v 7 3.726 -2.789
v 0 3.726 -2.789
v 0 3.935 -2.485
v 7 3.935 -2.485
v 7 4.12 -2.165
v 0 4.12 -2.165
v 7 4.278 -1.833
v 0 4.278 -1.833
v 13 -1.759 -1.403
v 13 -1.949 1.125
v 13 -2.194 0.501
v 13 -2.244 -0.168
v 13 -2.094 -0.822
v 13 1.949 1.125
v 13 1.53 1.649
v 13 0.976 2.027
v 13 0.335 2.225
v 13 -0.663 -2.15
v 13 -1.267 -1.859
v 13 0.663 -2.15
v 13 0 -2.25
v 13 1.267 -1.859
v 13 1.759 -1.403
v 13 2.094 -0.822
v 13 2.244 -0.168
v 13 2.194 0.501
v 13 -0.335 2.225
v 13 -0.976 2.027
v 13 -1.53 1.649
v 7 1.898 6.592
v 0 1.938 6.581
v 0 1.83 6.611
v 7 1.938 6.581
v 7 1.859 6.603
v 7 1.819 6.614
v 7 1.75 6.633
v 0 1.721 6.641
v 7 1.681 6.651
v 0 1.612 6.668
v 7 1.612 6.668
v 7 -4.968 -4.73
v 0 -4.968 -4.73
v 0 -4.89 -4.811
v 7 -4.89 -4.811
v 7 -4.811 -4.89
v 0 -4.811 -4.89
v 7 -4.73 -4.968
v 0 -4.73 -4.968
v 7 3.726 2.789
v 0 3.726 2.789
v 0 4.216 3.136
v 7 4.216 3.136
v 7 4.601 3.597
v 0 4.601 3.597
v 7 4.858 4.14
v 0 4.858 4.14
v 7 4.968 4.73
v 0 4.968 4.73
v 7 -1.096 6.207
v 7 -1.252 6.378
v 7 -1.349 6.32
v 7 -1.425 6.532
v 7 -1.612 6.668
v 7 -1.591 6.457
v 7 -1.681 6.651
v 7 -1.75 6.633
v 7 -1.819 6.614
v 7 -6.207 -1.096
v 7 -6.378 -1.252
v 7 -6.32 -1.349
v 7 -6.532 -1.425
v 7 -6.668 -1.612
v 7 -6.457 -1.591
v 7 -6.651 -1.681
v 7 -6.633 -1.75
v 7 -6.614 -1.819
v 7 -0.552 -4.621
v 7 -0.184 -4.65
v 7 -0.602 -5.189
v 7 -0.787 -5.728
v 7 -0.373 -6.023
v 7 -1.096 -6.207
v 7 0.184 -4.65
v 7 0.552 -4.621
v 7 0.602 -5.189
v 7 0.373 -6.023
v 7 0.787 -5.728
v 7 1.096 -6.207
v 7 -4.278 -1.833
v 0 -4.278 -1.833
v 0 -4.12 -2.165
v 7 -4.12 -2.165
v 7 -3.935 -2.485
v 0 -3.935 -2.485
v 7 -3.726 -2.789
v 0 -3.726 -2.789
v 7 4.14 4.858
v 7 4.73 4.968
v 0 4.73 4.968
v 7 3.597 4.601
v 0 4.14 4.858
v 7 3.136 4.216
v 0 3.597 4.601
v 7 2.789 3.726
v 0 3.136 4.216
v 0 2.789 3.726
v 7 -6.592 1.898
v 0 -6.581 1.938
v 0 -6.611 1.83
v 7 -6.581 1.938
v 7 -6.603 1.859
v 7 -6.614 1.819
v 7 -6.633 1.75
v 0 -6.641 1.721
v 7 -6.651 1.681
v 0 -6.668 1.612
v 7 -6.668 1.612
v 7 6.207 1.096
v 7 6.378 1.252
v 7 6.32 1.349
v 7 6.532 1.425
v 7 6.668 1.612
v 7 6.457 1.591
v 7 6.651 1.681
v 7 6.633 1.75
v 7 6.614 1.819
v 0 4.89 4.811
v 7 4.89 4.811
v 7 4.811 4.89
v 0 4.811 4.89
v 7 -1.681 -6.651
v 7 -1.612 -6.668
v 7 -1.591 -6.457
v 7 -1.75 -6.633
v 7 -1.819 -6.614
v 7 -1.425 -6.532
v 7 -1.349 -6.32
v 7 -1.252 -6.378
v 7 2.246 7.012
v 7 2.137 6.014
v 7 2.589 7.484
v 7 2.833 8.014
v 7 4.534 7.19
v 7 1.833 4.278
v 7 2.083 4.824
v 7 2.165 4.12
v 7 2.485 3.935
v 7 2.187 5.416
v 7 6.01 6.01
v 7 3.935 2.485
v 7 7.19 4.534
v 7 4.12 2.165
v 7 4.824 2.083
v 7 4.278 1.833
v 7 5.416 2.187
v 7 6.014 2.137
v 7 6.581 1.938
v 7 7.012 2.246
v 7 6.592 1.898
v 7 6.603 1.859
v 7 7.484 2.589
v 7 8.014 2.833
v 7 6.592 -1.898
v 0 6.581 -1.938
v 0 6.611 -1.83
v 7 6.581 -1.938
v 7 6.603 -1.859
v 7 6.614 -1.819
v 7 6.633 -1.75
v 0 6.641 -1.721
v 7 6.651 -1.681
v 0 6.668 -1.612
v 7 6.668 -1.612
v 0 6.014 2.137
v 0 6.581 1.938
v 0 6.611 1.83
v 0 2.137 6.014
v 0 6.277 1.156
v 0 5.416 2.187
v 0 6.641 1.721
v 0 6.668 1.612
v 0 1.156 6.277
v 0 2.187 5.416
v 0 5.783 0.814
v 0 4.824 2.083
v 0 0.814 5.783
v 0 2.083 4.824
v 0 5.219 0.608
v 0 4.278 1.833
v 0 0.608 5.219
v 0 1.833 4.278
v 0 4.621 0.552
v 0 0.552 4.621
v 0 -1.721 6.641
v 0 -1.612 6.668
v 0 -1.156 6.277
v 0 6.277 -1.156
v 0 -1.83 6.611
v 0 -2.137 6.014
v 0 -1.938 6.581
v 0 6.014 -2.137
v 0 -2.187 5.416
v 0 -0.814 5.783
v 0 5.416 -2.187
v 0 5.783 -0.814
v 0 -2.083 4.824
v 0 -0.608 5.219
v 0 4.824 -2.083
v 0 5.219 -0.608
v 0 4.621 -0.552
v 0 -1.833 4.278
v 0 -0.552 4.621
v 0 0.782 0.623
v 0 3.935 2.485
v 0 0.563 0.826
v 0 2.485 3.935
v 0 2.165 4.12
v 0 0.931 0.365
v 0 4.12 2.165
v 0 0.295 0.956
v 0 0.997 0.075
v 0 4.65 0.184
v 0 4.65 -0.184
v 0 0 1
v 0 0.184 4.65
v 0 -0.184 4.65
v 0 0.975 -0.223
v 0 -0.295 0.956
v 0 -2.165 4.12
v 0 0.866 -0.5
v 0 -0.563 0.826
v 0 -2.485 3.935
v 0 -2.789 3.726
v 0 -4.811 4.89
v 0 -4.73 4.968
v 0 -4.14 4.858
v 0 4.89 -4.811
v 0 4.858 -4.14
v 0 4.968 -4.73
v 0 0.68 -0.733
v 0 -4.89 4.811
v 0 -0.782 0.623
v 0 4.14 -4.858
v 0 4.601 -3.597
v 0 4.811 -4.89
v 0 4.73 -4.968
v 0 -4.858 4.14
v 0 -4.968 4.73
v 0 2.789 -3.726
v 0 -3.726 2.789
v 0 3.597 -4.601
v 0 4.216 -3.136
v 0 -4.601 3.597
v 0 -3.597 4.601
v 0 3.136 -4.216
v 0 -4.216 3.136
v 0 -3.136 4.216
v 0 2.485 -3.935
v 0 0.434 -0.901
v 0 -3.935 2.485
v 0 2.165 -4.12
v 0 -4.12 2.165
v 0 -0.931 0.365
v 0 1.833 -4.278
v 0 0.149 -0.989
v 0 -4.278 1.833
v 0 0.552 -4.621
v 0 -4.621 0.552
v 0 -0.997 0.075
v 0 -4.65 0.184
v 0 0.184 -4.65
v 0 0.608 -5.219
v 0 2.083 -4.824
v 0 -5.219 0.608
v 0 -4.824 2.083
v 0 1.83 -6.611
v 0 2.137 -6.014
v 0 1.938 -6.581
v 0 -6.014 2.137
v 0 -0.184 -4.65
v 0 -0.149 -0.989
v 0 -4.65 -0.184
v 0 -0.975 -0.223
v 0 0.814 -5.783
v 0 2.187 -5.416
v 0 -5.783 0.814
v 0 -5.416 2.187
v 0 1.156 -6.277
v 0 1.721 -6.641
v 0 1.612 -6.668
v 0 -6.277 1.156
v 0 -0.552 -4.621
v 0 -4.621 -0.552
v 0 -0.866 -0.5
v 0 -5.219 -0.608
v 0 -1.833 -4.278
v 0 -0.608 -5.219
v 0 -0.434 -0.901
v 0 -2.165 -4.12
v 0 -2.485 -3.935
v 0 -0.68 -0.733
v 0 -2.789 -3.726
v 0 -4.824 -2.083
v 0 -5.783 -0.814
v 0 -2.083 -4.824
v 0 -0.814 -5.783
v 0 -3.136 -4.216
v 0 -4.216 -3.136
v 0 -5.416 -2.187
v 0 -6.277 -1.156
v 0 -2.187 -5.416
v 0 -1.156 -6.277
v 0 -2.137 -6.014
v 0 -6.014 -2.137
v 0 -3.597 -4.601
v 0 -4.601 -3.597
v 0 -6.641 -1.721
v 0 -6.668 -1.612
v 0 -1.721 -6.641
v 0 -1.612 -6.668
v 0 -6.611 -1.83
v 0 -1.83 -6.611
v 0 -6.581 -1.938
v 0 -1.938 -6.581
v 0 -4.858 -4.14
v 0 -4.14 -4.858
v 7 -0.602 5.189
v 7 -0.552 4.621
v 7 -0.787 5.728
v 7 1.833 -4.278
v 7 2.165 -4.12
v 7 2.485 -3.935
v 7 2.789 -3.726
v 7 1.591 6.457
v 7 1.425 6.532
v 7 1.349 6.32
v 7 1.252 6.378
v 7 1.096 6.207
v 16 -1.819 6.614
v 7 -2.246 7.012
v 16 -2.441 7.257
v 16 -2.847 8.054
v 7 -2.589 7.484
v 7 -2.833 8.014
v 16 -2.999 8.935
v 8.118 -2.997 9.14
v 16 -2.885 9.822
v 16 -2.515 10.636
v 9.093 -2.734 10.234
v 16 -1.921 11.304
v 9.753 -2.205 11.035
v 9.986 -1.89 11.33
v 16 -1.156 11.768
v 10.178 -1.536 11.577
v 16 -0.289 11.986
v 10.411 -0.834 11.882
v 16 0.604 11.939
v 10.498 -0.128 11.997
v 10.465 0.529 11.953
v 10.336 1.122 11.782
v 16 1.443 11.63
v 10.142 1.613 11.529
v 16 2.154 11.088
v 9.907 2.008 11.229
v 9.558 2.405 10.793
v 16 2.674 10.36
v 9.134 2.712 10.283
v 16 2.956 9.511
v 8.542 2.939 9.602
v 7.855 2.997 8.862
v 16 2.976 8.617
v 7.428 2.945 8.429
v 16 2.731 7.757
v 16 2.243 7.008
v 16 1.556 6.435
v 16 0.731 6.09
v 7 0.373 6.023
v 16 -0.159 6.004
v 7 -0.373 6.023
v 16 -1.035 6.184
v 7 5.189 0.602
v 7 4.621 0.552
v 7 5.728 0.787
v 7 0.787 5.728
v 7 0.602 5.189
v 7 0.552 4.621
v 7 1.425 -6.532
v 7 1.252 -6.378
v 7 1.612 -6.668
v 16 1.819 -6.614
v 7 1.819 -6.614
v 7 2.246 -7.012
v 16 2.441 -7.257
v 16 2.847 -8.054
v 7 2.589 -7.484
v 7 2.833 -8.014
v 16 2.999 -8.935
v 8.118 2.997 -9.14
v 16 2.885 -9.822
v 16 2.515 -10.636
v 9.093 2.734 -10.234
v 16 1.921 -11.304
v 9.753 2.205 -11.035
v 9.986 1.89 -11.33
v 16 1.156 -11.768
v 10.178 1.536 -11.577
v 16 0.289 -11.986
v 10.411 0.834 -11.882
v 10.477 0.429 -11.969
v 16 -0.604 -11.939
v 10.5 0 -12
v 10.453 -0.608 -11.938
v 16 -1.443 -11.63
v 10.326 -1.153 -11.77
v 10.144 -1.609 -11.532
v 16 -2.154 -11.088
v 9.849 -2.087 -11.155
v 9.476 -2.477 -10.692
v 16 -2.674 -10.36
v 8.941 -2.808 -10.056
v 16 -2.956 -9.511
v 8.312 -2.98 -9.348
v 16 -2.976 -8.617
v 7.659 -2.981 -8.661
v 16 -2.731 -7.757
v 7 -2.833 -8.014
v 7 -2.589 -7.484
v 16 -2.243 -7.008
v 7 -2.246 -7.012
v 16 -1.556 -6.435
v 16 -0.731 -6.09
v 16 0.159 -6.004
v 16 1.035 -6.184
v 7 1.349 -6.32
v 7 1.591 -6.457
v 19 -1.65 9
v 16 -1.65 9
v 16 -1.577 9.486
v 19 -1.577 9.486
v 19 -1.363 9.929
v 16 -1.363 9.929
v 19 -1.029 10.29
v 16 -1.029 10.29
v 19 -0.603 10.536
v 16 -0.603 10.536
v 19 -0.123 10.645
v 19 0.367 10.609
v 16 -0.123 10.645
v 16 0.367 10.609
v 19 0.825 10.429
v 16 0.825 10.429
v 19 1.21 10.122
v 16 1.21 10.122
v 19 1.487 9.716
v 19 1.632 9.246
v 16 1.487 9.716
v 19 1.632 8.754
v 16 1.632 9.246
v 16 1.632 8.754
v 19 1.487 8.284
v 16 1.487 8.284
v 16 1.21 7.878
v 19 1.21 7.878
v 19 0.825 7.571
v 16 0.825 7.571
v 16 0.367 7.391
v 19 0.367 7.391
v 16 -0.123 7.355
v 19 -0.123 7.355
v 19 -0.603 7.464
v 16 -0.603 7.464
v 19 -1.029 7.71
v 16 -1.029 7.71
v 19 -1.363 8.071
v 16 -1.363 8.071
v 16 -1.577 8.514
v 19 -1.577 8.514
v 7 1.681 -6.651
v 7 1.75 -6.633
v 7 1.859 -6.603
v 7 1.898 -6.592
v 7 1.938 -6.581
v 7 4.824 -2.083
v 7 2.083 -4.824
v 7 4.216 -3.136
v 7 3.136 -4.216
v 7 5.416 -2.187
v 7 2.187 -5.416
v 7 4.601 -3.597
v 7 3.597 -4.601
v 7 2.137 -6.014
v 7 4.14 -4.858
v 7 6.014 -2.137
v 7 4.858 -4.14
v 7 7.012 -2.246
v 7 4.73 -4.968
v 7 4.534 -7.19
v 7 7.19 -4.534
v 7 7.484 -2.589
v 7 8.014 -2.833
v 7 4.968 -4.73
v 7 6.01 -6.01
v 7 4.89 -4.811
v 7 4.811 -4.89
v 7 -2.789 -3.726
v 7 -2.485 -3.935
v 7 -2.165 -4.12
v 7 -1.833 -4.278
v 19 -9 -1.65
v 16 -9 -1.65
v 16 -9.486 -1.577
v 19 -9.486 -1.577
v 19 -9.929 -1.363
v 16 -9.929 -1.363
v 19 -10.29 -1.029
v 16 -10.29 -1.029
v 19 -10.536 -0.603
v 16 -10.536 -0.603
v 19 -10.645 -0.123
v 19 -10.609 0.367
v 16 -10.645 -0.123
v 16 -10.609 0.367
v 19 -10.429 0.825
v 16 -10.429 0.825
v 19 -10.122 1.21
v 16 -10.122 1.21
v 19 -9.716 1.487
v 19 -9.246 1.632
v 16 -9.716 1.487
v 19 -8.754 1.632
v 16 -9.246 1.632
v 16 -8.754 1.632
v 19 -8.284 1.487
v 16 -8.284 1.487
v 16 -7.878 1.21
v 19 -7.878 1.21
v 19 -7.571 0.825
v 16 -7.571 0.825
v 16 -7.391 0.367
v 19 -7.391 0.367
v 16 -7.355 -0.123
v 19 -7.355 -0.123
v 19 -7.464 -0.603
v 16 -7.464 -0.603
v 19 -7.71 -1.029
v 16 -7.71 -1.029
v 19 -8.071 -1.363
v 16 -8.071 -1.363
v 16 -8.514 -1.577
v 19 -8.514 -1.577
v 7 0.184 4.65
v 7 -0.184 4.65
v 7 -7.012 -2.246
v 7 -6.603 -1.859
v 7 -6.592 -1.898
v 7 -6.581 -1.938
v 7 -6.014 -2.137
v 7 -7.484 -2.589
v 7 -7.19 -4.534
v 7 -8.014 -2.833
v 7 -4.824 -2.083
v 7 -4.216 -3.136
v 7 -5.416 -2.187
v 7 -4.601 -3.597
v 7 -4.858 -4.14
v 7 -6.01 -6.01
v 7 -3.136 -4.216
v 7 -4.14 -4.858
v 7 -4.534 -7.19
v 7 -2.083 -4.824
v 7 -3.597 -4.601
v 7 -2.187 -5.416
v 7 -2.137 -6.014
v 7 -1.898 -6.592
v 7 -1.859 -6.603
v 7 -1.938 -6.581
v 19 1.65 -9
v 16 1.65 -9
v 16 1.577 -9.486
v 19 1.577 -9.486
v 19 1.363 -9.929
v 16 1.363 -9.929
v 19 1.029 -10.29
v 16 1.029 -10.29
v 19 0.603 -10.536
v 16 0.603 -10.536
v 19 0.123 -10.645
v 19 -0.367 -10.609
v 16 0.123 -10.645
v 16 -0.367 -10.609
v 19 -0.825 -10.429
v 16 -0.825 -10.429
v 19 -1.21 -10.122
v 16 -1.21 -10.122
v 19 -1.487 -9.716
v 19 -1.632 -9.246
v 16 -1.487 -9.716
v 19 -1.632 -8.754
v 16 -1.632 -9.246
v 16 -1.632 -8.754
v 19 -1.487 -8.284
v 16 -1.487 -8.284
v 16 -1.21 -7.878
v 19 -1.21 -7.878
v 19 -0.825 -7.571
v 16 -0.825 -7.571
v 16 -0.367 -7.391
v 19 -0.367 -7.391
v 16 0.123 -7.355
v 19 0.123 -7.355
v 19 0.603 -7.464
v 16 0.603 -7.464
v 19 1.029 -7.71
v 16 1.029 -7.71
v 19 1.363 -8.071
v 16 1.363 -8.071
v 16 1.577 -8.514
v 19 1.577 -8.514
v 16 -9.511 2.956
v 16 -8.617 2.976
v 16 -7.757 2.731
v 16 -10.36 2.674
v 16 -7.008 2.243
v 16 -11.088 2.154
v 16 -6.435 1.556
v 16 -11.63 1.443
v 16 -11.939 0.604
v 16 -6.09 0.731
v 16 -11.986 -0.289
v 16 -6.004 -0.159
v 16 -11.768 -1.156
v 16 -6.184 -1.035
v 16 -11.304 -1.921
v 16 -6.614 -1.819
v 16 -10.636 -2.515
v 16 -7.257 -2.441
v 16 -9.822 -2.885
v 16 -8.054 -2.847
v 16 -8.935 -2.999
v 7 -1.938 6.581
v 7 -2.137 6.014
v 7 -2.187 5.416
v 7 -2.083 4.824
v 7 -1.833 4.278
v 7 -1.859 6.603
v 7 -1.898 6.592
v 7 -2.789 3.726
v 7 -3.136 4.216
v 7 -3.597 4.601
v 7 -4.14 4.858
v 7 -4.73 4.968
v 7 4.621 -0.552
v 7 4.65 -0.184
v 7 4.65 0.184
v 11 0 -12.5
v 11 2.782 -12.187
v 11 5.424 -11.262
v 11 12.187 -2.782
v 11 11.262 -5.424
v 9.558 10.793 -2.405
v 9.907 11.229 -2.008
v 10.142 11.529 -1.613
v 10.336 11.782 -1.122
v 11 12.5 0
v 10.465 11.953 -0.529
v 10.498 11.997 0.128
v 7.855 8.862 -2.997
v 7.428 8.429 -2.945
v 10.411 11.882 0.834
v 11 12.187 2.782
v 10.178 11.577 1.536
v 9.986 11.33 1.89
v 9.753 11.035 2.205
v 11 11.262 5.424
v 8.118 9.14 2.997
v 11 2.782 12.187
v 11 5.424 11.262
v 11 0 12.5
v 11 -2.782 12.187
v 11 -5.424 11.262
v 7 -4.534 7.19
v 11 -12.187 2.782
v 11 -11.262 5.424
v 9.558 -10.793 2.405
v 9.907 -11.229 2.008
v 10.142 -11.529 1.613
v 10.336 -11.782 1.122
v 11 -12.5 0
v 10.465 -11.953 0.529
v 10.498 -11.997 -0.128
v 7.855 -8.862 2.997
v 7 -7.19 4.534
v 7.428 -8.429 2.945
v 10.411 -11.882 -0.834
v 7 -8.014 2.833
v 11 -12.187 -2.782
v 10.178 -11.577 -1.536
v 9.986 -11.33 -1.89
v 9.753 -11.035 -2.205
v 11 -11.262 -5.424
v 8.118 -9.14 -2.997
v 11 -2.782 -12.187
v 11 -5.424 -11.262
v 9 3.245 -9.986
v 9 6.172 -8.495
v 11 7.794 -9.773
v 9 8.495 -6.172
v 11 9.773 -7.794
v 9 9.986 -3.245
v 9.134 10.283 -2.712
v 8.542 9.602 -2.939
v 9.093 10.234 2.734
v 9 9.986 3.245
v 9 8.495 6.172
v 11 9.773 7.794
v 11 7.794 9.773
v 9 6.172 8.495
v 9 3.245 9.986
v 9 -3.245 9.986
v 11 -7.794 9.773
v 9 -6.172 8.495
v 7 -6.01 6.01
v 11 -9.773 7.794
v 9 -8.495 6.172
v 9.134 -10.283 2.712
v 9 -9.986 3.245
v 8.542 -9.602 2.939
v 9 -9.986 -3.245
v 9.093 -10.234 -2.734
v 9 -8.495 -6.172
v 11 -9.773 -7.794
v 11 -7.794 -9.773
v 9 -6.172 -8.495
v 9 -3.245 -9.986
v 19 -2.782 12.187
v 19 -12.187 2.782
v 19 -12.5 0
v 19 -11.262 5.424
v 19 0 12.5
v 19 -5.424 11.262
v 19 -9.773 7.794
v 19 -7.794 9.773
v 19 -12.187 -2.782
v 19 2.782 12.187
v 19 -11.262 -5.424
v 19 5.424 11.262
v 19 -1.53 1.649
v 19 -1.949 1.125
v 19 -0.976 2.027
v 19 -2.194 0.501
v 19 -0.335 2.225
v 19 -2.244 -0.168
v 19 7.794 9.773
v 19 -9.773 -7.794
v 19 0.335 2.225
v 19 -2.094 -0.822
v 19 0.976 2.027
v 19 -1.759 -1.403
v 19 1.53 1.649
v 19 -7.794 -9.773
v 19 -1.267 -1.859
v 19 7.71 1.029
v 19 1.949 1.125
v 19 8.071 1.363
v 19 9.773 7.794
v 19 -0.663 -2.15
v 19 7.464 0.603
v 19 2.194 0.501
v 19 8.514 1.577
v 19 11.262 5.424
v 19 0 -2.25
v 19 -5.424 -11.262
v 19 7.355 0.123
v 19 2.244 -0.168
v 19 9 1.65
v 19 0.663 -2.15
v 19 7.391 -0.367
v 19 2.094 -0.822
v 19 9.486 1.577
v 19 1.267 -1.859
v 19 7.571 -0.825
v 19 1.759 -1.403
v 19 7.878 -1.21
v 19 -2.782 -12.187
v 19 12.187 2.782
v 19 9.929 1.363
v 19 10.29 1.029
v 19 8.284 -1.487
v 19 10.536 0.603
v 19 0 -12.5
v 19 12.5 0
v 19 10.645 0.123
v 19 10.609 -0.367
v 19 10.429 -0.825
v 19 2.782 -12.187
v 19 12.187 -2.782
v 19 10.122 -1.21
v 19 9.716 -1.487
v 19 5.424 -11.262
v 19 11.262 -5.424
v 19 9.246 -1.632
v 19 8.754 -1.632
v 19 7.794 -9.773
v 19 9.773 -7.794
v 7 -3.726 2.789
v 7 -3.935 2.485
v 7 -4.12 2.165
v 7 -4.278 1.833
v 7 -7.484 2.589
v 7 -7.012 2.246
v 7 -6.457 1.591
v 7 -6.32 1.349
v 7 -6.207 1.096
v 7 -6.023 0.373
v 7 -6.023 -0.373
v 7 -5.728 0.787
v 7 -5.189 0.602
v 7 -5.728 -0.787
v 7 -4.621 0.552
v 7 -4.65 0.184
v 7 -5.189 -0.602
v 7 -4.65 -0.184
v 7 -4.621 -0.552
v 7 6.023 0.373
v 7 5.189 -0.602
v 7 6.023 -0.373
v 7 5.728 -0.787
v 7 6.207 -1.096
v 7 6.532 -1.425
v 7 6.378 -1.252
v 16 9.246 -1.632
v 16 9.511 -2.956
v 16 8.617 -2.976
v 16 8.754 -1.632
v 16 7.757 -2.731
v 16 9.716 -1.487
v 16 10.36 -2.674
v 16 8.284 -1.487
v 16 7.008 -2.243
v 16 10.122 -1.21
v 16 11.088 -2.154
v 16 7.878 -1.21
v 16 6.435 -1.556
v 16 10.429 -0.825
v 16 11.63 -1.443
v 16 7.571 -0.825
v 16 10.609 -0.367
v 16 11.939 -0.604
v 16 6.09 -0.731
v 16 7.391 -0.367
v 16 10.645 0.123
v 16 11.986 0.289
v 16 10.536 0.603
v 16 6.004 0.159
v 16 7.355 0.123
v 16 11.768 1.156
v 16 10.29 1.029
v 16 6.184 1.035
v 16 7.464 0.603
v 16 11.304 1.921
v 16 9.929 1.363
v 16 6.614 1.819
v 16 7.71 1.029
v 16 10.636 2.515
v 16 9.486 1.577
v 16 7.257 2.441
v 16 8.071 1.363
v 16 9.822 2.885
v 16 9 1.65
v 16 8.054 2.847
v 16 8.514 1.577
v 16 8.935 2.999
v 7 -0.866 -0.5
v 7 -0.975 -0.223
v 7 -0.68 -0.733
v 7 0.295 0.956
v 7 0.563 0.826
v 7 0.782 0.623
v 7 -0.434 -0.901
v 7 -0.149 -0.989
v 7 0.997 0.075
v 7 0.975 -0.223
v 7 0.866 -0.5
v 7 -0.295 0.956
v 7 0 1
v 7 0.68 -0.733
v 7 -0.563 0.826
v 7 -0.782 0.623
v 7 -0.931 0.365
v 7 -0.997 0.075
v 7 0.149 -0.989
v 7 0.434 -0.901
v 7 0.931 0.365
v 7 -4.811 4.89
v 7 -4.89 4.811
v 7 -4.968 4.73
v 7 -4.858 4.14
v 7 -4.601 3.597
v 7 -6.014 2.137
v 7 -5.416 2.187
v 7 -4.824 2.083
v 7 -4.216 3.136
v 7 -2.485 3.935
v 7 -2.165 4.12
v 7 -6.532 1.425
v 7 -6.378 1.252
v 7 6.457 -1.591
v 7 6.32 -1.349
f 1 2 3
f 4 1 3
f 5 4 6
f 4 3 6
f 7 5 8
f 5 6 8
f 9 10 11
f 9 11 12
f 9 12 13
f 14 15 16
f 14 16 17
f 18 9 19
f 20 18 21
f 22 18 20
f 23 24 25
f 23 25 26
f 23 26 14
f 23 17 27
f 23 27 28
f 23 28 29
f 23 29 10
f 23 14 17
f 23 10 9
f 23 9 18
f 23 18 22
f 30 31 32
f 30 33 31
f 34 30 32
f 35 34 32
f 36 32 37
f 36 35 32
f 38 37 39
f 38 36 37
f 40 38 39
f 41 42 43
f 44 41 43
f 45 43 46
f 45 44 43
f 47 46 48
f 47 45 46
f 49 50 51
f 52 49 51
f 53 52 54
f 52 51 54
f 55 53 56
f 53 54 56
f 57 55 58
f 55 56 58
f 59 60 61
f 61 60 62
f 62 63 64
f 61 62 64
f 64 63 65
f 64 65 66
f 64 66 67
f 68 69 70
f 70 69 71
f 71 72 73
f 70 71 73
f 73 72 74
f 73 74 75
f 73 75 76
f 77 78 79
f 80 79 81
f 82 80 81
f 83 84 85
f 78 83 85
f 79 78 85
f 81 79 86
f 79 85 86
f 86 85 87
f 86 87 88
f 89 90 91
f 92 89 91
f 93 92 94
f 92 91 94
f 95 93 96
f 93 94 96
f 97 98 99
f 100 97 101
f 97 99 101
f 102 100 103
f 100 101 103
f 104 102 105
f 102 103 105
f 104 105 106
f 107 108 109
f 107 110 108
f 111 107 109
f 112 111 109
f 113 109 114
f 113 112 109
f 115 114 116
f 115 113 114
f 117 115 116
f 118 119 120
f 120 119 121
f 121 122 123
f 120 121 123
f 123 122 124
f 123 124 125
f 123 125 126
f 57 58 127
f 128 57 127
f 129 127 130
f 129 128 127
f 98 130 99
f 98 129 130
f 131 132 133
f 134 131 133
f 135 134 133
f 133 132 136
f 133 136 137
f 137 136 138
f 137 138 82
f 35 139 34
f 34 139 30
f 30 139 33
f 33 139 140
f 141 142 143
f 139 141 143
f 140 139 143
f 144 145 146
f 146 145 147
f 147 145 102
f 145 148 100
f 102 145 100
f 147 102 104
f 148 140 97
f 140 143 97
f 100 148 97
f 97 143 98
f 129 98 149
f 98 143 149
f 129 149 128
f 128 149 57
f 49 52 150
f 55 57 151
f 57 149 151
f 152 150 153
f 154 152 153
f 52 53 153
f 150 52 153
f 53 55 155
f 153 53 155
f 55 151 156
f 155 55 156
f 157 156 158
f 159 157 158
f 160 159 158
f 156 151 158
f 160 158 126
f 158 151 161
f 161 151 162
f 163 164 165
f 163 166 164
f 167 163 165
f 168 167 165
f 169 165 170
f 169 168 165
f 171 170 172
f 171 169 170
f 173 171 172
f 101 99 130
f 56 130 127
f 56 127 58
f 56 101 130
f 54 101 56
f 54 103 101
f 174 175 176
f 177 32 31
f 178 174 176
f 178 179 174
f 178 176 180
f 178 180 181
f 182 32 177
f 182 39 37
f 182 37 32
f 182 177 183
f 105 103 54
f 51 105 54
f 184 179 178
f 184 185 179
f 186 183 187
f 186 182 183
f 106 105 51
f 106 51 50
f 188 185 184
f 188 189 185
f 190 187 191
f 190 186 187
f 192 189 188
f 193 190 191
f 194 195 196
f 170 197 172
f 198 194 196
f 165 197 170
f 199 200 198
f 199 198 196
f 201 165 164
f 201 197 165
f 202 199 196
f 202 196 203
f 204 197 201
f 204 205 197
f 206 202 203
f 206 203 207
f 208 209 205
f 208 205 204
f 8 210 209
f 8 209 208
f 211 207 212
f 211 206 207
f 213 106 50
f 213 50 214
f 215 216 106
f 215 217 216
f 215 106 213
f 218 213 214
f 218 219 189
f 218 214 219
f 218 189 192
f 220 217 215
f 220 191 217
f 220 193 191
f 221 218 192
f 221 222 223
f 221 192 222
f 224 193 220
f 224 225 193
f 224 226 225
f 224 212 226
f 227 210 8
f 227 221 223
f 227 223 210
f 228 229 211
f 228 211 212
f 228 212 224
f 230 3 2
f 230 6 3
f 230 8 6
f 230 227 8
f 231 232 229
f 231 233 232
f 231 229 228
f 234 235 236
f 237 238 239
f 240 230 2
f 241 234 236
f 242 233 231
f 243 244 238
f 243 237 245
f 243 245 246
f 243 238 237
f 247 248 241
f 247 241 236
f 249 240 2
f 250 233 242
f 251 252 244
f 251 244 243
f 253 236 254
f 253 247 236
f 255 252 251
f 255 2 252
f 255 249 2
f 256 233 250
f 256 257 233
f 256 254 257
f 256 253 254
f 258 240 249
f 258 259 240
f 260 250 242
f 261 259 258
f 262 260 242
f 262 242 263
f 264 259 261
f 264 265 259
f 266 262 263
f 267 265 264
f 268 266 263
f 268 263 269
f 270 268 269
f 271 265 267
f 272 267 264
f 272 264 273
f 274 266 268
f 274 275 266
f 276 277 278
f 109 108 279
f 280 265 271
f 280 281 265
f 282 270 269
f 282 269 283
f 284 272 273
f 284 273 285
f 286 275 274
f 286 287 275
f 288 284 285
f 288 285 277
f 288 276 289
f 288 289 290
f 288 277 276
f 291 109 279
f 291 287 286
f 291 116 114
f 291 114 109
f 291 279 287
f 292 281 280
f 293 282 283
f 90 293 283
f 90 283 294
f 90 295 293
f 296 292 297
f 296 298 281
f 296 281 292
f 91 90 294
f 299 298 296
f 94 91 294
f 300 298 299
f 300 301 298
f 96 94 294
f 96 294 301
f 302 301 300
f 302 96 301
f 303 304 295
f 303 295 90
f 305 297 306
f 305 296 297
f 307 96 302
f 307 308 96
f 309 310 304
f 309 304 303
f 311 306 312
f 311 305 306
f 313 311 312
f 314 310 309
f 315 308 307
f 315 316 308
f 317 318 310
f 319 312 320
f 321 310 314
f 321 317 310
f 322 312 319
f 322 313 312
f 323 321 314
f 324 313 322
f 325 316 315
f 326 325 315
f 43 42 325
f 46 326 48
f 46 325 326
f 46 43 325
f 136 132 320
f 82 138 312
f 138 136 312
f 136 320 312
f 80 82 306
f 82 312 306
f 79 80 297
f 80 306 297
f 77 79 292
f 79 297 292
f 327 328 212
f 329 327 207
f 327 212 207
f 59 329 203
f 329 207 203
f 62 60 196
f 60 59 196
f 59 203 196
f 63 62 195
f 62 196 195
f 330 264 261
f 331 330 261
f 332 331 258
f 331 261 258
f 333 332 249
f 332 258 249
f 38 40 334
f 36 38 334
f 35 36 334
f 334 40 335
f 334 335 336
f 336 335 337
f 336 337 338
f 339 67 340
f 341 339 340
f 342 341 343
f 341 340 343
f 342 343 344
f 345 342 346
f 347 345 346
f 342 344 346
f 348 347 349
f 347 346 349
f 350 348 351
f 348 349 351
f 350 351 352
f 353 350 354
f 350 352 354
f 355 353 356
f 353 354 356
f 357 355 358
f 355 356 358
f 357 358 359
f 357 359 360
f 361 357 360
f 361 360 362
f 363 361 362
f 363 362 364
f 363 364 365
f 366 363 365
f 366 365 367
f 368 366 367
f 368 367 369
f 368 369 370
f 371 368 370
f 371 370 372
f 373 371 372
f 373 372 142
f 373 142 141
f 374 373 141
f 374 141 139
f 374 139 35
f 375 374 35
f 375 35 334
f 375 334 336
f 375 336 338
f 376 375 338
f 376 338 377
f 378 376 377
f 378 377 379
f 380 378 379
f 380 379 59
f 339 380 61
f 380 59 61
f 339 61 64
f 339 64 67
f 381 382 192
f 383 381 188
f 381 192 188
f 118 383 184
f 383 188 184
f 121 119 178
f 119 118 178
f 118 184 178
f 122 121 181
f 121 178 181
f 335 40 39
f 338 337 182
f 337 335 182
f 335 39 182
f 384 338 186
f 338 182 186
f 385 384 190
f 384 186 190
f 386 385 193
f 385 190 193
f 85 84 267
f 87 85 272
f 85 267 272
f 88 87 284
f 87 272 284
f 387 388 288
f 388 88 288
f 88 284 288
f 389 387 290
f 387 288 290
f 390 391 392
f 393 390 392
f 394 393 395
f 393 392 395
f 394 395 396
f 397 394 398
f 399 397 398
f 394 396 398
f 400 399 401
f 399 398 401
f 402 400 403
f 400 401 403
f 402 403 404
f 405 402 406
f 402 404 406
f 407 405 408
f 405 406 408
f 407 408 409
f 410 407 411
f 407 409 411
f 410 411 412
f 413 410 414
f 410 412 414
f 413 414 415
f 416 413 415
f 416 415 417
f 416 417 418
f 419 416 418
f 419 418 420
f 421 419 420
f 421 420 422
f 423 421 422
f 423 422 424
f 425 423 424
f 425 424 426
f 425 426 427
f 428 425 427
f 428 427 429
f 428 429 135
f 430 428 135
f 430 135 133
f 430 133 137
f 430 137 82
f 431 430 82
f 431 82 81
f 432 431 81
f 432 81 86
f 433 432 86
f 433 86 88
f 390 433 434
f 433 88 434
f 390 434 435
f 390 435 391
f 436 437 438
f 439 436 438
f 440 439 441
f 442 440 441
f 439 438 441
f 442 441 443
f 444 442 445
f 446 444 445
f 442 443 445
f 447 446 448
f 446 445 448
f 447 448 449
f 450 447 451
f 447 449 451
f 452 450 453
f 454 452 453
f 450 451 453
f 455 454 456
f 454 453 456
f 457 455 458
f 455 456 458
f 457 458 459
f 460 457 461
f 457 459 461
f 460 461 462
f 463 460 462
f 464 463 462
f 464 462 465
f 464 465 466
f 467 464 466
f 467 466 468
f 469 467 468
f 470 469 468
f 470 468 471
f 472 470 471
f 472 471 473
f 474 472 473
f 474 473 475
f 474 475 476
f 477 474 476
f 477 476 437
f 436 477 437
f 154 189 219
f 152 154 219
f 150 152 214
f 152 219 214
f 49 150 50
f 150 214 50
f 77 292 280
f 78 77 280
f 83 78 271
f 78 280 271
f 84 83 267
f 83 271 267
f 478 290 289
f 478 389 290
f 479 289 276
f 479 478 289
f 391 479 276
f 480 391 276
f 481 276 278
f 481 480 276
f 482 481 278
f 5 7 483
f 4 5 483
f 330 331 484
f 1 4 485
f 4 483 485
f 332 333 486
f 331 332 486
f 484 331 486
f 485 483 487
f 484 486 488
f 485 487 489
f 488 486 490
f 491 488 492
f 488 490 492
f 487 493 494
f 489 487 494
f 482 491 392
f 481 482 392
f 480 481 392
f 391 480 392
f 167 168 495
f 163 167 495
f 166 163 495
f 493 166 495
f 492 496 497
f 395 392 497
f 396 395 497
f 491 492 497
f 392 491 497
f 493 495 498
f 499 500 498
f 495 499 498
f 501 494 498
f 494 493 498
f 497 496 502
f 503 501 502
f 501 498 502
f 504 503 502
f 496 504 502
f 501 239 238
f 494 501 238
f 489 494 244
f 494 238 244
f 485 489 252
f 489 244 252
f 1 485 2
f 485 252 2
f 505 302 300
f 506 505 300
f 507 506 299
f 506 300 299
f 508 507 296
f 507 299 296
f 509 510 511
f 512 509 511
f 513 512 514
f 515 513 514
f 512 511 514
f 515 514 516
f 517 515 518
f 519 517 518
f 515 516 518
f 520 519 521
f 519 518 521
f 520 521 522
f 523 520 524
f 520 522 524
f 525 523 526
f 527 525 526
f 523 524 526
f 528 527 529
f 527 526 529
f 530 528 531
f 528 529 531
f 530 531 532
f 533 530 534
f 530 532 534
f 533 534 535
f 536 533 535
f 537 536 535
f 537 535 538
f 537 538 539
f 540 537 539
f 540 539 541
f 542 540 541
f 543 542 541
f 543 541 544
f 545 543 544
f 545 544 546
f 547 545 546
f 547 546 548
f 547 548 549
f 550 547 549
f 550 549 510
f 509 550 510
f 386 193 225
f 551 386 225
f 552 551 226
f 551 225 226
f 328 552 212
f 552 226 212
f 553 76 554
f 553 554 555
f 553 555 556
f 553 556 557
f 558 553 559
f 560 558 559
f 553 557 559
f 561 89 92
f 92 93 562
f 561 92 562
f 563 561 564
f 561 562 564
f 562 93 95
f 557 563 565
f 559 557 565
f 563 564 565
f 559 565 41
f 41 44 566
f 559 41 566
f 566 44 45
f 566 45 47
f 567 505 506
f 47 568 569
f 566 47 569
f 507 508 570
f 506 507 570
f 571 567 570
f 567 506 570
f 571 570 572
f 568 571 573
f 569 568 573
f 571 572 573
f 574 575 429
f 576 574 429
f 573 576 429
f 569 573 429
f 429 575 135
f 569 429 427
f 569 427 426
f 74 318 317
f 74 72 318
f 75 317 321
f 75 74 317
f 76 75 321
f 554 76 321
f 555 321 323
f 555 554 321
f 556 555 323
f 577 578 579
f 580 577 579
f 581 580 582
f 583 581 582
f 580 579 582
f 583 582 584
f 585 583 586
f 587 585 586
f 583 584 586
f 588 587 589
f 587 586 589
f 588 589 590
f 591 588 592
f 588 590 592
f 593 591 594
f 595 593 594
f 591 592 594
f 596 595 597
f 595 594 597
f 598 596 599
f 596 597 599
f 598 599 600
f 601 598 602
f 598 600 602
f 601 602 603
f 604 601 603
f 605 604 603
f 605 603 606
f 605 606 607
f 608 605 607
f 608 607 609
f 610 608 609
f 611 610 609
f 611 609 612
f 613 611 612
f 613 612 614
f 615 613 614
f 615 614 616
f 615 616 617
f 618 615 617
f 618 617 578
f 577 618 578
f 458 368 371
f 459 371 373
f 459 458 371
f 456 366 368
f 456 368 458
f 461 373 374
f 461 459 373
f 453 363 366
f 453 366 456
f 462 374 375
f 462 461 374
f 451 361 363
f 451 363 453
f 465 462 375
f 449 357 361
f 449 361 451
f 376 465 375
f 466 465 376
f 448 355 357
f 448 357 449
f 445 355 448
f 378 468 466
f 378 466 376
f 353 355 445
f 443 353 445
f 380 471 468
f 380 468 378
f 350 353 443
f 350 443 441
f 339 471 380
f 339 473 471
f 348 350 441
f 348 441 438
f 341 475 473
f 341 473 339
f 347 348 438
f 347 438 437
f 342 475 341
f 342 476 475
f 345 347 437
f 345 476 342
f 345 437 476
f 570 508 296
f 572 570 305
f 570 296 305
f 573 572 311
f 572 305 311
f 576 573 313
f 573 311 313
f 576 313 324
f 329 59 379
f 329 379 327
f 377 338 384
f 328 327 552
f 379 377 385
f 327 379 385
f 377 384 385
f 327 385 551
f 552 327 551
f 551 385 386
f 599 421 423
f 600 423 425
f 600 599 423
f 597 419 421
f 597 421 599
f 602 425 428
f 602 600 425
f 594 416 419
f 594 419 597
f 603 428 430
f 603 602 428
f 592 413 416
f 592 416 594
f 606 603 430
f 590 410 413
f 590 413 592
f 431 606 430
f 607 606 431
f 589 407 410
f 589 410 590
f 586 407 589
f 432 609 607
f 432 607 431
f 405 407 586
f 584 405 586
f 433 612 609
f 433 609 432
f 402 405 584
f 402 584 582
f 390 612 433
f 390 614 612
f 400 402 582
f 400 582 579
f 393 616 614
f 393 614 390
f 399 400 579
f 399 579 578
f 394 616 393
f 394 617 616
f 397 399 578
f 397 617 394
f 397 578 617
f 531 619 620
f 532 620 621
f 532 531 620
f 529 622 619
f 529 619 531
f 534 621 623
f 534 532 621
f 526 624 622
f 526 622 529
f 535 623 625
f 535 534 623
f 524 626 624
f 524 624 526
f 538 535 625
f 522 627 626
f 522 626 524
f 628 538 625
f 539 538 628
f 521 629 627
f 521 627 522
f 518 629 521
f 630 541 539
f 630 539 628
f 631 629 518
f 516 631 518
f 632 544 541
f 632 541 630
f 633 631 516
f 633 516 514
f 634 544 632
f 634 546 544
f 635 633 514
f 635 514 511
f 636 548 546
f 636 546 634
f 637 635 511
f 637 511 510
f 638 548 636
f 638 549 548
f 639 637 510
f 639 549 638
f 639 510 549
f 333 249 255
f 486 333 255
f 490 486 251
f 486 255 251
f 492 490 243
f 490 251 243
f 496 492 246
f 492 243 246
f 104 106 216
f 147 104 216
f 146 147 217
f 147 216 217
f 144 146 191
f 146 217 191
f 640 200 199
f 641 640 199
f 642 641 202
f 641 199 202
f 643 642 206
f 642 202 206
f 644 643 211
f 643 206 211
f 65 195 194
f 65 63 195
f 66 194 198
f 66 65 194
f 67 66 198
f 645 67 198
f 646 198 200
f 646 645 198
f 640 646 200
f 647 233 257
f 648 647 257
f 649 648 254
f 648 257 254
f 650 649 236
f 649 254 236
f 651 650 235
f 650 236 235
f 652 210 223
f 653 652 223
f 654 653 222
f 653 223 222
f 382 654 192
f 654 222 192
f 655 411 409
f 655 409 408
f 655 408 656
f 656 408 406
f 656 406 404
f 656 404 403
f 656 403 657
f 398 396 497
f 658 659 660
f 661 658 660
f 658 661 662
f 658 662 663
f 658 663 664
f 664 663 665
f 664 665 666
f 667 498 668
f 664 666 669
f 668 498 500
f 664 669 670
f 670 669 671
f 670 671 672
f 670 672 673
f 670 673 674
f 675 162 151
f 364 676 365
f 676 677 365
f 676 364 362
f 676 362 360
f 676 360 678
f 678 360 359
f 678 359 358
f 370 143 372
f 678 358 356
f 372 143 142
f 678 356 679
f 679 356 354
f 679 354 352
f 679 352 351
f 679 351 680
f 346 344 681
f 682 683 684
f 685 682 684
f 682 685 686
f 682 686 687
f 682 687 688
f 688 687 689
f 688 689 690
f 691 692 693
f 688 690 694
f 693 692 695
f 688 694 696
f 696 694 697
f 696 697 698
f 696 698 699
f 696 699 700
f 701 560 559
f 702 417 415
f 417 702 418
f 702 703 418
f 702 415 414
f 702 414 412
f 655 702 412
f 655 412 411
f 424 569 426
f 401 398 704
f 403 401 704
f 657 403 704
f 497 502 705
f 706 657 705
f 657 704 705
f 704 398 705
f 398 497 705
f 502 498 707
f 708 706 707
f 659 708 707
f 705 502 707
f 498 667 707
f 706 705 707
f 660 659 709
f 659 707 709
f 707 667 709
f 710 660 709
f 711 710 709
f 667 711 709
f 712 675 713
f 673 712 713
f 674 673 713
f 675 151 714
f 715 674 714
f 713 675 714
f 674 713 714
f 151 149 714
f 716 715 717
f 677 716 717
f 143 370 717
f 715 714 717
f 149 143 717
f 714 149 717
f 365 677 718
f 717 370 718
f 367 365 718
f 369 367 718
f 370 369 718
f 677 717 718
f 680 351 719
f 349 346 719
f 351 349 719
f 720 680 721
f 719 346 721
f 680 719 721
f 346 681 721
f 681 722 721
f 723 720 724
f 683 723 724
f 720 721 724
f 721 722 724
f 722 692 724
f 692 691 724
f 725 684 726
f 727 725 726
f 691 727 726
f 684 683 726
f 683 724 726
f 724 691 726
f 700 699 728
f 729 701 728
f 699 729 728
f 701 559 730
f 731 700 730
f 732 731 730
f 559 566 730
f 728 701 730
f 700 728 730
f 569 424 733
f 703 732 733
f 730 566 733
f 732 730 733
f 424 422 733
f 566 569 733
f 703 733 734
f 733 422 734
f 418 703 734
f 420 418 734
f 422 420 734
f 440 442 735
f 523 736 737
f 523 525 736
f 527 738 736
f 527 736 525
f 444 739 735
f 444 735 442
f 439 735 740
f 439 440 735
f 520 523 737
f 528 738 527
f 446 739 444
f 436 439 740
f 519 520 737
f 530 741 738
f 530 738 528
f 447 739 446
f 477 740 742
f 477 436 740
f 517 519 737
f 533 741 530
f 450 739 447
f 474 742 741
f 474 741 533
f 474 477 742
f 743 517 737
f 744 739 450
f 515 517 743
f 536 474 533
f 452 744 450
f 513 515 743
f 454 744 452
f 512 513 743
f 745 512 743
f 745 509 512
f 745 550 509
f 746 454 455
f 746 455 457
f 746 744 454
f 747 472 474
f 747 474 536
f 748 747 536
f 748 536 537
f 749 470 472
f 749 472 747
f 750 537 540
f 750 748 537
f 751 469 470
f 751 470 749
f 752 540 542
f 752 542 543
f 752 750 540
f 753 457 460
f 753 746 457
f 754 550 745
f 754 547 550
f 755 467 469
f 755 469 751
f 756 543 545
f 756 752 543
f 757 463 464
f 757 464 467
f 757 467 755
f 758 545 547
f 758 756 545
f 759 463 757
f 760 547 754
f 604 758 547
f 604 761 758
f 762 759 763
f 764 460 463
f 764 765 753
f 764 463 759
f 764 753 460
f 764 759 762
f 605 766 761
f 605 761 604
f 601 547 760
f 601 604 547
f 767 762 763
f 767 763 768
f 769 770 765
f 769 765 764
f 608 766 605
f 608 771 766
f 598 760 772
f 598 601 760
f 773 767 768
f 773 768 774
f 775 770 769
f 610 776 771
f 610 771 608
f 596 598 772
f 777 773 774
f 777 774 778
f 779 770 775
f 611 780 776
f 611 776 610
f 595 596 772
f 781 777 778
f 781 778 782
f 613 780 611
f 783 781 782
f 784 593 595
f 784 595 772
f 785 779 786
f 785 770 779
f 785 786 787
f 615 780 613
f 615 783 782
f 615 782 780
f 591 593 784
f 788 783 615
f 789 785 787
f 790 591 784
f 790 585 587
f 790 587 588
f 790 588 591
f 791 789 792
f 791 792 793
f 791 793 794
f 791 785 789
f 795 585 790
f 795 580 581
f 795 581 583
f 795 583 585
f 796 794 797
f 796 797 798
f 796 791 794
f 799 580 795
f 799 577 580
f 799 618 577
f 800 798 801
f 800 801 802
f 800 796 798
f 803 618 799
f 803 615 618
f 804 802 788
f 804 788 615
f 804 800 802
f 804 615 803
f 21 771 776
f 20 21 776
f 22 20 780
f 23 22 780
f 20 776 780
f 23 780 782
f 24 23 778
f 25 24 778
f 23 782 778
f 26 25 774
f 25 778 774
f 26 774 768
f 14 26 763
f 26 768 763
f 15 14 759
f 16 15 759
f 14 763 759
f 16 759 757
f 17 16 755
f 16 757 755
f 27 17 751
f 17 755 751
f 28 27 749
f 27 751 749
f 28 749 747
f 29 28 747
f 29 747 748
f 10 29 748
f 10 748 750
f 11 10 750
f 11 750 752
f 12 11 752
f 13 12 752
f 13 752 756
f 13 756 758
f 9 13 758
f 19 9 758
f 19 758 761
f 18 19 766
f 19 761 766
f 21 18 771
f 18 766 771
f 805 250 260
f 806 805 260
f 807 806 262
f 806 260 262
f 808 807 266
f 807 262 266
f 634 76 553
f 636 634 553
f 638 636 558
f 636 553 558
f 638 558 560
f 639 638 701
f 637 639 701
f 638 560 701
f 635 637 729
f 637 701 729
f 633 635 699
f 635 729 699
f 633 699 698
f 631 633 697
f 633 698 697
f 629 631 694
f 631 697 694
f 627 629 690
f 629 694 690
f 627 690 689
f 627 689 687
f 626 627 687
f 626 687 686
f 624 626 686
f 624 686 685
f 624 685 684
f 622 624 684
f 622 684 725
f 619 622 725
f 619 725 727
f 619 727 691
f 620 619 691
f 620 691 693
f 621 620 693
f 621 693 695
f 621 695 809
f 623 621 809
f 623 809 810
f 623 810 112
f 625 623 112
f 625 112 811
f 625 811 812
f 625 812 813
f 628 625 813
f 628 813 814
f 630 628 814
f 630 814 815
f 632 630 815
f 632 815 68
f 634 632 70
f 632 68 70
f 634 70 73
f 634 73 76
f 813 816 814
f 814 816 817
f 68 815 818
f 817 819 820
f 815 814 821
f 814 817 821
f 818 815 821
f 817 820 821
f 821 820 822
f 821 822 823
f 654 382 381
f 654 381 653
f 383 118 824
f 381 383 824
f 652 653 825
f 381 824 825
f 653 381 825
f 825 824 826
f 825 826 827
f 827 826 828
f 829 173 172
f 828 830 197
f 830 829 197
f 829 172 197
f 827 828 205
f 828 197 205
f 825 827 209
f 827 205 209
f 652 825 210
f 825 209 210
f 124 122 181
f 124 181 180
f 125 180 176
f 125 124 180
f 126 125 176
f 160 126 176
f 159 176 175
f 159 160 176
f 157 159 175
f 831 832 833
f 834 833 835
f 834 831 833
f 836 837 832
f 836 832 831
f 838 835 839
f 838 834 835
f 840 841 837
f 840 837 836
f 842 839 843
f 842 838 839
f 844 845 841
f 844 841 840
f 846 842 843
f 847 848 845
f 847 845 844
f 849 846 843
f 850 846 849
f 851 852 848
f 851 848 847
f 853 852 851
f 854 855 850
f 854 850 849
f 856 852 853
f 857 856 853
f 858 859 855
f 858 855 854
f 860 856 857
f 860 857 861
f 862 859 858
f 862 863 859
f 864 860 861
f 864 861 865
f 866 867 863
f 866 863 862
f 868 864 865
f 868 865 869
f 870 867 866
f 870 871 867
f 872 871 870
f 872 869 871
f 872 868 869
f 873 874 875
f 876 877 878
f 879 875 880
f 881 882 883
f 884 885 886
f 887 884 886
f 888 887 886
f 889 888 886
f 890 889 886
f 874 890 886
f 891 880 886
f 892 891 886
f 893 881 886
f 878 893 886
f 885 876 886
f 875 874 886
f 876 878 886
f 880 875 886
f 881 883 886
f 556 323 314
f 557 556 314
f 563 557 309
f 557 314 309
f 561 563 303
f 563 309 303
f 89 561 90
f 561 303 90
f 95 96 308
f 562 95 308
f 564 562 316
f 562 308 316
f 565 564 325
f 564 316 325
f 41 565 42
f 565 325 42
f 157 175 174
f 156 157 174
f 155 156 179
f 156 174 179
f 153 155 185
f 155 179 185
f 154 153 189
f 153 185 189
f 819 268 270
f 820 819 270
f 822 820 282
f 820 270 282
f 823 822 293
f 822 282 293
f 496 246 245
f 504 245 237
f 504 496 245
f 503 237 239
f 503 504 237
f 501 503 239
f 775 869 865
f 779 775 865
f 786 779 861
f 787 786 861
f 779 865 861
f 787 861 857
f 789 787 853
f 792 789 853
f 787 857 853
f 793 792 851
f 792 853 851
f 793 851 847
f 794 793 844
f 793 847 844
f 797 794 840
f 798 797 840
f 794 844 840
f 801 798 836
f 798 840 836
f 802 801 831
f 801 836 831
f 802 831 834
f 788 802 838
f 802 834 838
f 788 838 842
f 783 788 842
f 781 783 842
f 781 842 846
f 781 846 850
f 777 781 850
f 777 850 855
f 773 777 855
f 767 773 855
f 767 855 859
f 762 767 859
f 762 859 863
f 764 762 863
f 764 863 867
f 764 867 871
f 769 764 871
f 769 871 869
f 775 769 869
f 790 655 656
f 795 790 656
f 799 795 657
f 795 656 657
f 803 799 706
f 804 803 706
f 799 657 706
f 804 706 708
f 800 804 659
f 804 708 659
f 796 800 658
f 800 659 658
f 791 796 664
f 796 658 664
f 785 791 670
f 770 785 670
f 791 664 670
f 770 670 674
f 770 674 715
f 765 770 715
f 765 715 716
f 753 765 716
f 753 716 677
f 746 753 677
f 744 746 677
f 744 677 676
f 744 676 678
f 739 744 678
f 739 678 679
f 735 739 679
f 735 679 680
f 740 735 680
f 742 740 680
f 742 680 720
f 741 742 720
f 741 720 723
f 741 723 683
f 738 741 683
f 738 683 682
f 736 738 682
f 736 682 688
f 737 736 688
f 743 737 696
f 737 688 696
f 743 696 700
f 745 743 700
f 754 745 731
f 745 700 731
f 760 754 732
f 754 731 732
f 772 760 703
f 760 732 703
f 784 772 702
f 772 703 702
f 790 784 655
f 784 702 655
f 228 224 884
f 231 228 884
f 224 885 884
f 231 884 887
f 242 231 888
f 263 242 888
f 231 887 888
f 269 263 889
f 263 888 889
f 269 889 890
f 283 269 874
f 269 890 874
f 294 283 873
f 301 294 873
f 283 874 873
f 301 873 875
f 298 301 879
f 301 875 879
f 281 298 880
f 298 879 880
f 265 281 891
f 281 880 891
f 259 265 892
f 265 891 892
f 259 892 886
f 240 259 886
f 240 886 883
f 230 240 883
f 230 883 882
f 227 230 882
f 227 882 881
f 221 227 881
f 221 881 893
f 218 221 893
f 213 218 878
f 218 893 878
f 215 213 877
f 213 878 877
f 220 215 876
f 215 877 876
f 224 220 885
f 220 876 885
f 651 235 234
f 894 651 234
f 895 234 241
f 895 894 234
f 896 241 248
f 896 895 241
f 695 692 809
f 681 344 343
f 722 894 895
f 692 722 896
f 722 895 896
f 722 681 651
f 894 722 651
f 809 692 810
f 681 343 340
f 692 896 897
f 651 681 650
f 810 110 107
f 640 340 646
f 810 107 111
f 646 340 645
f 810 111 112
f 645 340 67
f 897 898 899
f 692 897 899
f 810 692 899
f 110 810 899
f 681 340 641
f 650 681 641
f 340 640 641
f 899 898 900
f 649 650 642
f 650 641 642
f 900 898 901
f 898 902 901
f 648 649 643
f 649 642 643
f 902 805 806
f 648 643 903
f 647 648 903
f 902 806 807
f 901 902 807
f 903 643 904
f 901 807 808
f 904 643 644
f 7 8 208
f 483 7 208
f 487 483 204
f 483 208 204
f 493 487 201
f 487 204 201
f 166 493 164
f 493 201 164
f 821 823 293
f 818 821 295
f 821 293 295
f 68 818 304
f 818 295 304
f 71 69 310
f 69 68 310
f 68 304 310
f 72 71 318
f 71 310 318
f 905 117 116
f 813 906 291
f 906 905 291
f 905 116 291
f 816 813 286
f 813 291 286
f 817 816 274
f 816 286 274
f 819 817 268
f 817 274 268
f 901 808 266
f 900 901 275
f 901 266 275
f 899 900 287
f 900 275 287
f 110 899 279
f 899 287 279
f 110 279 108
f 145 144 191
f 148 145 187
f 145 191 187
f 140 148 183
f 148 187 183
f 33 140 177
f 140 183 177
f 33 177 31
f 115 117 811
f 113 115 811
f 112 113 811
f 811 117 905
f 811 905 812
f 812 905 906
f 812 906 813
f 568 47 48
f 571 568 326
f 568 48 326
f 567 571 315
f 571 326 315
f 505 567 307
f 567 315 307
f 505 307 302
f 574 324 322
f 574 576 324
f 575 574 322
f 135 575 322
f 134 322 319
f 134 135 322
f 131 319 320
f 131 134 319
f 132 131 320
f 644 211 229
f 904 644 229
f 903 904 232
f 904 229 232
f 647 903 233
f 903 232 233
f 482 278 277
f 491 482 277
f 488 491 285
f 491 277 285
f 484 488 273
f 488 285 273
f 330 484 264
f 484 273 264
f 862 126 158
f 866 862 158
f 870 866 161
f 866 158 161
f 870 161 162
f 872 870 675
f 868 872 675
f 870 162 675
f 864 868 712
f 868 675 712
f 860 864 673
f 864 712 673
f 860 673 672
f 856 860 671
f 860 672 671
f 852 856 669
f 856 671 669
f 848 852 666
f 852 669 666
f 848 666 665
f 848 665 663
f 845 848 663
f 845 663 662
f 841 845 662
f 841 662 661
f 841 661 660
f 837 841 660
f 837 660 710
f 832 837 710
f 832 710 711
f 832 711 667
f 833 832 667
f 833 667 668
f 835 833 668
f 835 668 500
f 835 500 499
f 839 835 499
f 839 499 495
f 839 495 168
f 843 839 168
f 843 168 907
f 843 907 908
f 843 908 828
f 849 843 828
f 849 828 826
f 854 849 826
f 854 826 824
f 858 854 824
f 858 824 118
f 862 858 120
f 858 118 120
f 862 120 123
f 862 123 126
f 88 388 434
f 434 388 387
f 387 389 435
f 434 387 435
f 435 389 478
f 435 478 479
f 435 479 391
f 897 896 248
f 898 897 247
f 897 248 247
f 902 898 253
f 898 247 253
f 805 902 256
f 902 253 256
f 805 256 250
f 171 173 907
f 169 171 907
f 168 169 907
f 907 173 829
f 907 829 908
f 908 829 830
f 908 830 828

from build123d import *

# Parameters (mm, degrees)
BASPROSKE_W         = 7
BASPROSKE_H         = 6.86
TOOTHCUT_DEPTH      = 12.963243707
TEETHCUTS_COUNT     = 12
TEETHCUTS_ANGLE     = 330
BORSKE_R            = 1
BORE_DEPTH          = 50.0000508
SKETCH1_R           = 12.5
BOSS_EXTRUDE1_DEPTH = 12
SKETCH2_R           = 1.65
CUT_EXTRUDE1_DEPTH  = 22.365860619
SKETCH3_R           = 3
CUT_EXTRUDE2_DEPTH  = 9
CIRPATTERN1_COUNT   = 4
CHAMFER1_SIZE       = 4
SKETCH4_R           = 2.25
CUT_EXTRUDE3_DEPTH  = 6


with BuildPart() as part:
    # BasProSke → Base-Revolve (revolve)
    with BuildSketch(Plane(origin=(0, 0, 0), x_dir=(1, 0, 0), z_dir=(0, 1, 0)), mode=Mode.PRIVATE) as base_revolve_sk:
        with Locations((3.5, 3.43)):
            Rectangle(BASPROSKE_W, BASPROSKE_H)
    revolve(base_revolve_sk.sketch.rotate(Axis((-10, 0, 0), (1, 0, 0)), 180), axis=Axis((-10, 0, 0), (1, 0, 0)))

    # TooCutSke → ToothCut (cut, through all)
    with BuildSketch(Plane(origin=(0, 0, 0), x_dir=(0, 0, -1), z_dir=(1, 0, 0))):
        with BuildLine():
            ThreePointArc((0.552016647, 4.621146354), (0, 4.654), (-0.552016647, 4.621146354))
            ThreePointArc((-0.552016647, 4.621146354), (-0.822258441, 5.798784691), (-1.641510828, 6.686865885))
            ThreePointArc((-1.641510828, 6.686865885), (0, 6.8854), (1.641510828, 6.686865885))
            ThreePointArc((1.641510828, 6.686865885), (0.822258441, 5.798784691), (0.552016647, 4.621146354))
        make_face()
    toothcut = extrude(amount=TOOTHCUT_DEPTH, mode=Mode.SUBTRACT)

    # TeethCuts: ToothCut ×12 about axis
    teethcuts_axis = Axis((-10, 0, 0), (1, 0, 0))
    for i in range(1, TEETHCUTS_COUNT):
        add(toothcut.rotate(teethcuts_axis, i * TEETHCUTS_ANGLE / (TEETHCUTS_COUNT - 1)), mode=Mode.SUBTRACT)

    # BorSke → Bore (cut, symmetric)
    with BuildSketch(Plane(origin=(0, 0, 0), x_dir=(0, 0, -1), z_dir=(1, 0, 0))):
        with Locations(Location((0, 0, 0), (0, 0, 180))):
            Circle(BORSKE_R)
    extrude(amount=BORE_DEPTH, both=True, mode=Mode.SUBTRACT)

    # Sketch1 → Boss-Extrude1 (add)
    with BuildSketch(Plane(origin=(7, 0, 0), x_dir=(0, 0, -1), z_dir=(1, 0, 0))):
        Circle(SKETCH1_R)
    extrude(amount=BOSS_EXTRUDE1_DEPTH)

    # Sketch2 → Cut-Extrude1 (cut, through all)
    with BuildSketch(Plane.ZY.offset(-7)):
        with Locations((0, 9)):
            Circle(SKETCH2_R)
    cut_extrude1 = extrude(amount=-CUT_EXTRUDE1_DEPTH, mode=Mode.SUBTRACT)

    # Sketch3 → Cut-Extrude2 (cut)
    with BuildSketch(Plane.ZY.offset(-7)):
        with Locations(Location((0, 9, 0), (0, 0, 307.326549715))):
            Circle(SKETCH3_R)
    cut_extrude2 = extrude(amount=-CUT_EXTRUDE2_DEPTH, mode=Mode.SUBTRACT)

    # CirPattern1: Cut-Extrude1, Cut-Extrude2 ×4 about axis
    cirpattern1_axis = Axis((0, 0, 0), (1, 0, 0))
    add([cut_extrude1.rotate(cirpattern1_axis, i * 360 / CIRPATTERN1_COUNT) for i in range(1, CIRPATTERN1_COUNT)], mode=Mode.SUBTRACT)
    add([cut_extrude2.rotate(cirpattern1_axis, i * 360 / CIRPATTERN1_COUNT) for i in range(1, CIRPATTERN1_COUNT)], mode=Mode.SUBTRACT)

    # Chamfer1
    # the kernel refuses this chamfer: 4 mm, written as the material it takes off along each edge
    with BuildSketch(Plane(origin=(7, 0, 0), x_dir=(0, 0, -1), z_dir=(0, -1, 0))) as chamfer1_piece_1:
        Polygon((12.5, CHAMFER1_SIZE), (12.5 - CHAMFER1_SIZE, 0), (12.5, 0), align=None)
    revolve(axis=Axis((7, 0, 0), (1, 0, 0)), mode=Mode.SUBTRACT)

    # Sketch4 → Cut-Extrude3 (cut)
    with BuildSketch(Plane(origin=(19, 0, 0), x_dir=(0, 0, -1), z_dir=(1, 0, 0))):
        Circle(SKETCH4_R)
    extrude(amount=-CUT_EXTRUDE3_DEPTH, mode=Mode.SUBTRACT)


solid = part.part
